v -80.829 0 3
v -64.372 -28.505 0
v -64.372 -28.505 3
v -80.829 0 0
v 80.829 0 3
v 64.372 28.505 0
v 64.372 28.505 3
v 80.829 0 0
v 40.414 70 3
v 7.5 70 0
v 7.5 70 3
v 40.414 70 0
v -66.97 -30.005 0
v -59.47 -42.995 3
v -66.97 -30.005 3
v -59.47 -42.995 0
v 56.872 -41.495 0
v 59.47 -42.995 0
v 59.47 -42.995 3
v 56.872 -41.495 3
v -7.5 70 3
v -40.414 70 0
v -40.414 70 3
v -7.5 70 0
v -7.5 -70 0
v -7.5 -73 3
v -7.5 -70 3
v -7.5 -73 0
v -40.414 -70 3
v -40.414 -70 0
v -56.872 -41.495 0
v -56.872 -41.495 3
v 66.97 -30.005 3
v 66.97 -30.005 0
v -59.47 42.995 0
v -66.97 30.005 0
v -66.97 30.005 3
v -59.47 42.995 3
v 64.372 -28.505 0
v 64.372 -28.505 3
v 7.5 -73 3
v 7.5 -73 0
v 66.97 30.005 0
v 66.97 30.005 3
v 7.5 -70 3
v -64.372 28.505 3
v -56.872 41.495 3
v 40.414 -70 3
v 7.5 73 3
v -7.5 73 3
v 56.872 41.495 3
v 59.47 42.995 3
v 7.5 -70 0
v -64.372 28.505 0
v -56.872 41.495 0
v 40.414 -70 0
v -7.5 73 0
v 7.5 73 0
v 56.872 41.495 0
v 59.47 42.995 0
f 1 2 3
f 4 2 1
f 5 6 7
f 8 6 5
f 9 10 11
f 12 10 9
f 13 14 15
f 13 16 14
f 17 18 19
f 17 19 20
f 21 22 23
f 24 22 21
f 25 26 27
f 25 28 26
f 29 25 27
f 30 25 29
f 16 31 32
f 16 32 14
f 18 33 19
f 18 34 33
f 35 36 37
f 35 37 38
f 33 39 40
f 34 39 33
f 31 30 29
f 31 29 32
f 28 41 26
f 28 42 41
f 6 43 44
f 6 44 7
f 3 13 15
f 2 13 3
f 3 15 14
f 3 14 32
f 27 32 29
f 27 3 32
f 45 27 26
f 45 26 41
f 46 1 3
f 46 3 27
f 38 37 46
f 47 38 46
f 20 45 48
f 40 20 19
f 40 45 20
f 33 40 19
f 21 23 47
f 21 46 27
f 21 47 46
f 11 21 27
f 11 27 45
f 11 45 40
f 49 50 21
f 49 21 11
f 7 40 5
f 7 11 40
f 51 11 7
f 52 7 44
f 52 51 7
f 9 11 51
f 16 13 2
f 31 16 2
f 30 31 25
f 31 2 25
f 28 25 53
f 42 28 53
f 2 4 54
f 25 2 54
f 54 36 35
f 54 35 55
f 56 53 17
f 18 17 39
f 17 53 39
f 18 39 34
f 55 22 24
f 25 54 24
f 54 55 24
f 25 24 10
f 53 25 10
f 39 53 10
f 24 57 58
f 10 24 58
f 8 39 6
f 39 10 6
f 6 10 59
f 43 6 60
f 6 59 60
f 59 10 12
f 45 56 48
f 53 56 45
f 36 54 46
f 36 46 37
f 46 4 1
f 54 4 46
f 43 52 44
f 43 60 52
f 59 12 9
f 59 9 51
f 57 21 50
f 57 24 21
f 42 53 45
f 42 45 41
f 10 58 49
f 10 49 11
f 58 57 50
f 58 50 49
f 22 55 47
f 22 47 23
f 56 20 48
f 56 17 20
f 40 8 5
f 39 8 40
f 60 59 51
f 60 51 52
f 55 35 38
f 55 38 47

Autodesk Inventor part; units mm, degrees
ref_plane "YZ Plane" through (0, 0, 0) normal (1, 0, 0) x (0, 1, 0)
ref_plane "XZ Plane" through (0, 0, 0) normal (0, 1, 0) x (-1, 0, 0)
ref_plane "XY Plane" through (0, 0, 0) normal (0, 0, 1) x (1, 0, 0)
sketch "Sketch1" plane through (0, 0, 0) normal (0, 0, 1) x (1, 0, 0)
  line L0 (-7.5, 73) -> (7.5, 73)
  line L1 (7.5, 73) -> (7.5, 70)
  line L2 (-7.5, 70) -> (-7.5, 73)
  line L3 (-40.4145, 70) -> (-7.5, 70)
  line L4 (7.5, 70) -> (40.4145, 70)
  line L5 (-66.9699, 30.0048) -> (-59.4699, 42.9952)
  line L6 (-59.4699, 42.9952) -> (-56.8718, 41.4952)
  line L7 (-64.3718, 28.5048) -> (-66.9699, 30.0048)
  line L8 (-59.4699, -42.9952) -> (-66.9699, -30.0048)
  line L9 (-66.9699, -30.0048) -> (-64.3718, -28.5048)
  line L10 (-56.8718, -41.4952) -> (-59.4699, -42.9952)
  line L11 (7.5, -73) -> (-7.5, -73)
  line L12 (-7.5, -73) -> (-7.5, -70)
  line L13 (7.5, -70) -> (7.5, -73)
  line L14 (66.9699, -30.0048) -> (59.4699, -42.9952)
  line L15 (59.4699, -42.9952) -> (56.8718, -41.4952)
  line L16 (64.3718, -28.5048) -> (66.9699, -30.0048)
  line L17 (59.4699, 42.9952) -> (66.9699, 30.0048)
  line L18 (66.9699, 30.0048) -> (64.3718, 28.5048)
  line L19 (56.8718, 41.4952) -> (59.4699, 42.9952)
  line L20 (-80.829, 0) -> (-64.3718, 28.5048)
  line L21 (-56.8718, 41.4952) -> (-40.4145, 70)
  line L22 (40.4145, 70) -> (56.8718, 41.4952)
  line L23 (64.3718, 28.5048) -> (80.829, 0)
  line L24 (80.829, 0) -> (64.3718, -28.5048)
  line L25 (56.8718, -41.4952) -> (40.4145, -70)
  line L26 (40.4145, -70) -> (7.5, -70)
  line L27 (-7.5, -70) -> (-40.4145, -70)
  line L28 (-40.4145, -70) -> (-56.8718, -41.4952)
  line L29 (-64.3718, -28.5048) -> (-80.829, 0)
  point P0 (0, 0)
  point P1 (0, 0)
  point P2 (0, 73)
  point P3 (-63.2199, 36.5)
  point P4 (-63.2199, -36.5)
  point P5 (0, -73)
  point P6 (63.2199, -36.5)
  point P7 (63.2199, 36.5)
  dimension "d1" = 3
  dimension "d3" = 15
  dimension "d6" = 360
  dimension "d8" = 140
  dimension "d9" = 146
extrude "Extrusion1" add sketch "Sketch1" along normal blind 3
properties part number "middle_space"
